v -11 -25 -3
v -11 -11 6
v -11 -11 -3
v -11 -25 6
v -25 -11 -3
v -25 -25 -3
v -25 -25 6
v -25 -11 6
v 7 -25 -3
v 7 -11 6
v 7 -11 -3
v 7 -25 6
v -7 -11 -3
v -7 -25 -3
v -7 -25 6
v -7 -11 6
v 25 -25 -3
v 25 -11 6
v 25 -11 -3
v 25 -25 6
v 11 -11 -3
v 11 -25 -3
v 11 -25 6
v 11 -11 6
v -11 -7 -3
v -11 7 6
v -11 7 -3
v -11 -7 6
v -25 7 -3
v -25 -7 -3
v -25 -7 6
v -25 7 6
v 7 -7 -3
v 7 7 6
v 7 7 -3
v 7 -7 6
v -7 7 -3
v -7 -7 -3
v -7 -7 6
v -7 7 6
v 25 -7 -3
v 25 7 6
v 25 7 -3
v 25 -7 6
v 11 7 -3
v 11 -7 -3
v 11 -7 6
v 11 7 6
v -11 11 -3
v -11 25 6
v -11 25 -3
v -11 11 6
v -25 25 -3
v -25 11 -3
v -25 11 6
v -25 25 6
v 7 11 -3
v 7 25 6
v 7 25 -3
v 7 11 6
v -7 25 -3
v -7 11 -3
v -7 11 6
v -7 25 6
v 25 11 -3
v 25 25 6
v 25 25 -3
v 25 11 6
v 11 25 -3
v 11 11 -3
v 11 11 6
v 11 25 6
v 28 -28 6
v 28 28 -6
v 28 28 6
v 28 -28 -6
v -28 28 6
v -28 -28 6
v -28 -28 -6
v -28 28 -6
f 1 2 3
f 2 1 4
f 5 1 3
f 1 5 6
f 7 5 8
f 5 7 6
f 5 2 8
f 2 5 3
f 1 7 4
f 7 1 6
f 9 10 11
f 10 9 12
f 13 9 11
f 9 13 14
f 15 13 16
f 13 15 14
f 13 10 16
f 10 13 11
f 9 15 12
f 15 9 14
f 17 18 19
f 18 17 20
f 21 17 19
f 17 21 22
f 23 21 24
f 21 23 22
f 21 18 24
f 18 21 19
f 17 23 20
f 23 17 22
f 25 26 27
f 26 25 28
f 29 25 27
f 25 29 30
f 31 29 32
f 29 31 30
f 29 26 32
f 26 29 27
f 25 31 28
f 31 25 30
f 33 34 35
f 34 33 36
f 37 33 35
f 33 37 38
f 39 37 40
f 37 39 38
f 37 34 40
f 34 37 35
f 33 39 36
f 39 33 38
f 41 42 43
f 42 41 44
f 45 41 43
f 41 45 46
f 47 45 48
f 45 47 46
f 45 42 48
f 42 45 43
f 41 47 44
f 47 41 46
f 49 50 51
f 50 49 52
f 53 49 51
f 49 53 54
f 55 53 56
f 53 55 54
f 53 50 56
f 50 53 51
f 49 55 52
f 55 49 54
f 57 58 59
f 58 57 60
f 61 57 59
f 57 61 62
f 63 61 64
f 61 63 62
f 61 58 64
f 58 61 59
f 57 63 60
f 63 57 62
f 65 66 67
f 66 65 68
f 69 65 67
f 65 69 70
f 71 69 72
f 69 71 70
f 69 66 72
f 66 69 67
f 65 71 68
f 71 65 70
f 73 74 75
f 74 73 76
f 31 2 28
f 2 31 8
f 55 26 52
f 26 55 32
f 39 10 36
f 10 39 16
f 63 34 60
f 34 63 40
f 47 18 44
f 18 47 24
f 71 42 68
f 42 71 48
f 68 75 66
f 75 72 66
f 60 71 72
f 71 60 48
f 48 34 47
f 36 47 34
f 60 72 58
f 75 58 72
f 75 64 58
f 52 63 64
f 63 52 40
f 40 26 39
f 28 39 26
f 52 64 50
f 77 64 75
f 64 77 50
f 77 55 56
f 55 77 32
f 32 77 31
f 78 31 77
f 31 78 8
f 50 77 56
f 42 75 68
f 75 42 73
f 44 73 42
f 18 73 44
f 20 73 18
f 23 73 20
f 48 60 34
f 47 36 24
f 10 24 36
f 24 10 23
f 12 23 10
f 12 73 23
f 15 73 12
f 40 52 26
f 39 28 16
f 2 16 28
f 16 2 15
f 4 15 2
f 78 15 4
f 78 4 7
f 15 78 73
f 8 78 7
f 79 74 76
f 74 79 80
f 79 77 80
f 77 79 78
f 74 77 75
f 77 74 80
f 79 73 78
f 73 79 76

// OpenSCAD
$fn = 32;

// ----------------------------------------------------------------------
// Pocket plate 56 x 56 x 12
// 3 x 3 pockets 14 mm square, 9 mm deep
// ----------------------------------------------------------------------

// --- parameters (mm) ---
thickness = 12;  // plate thickness
floor_t = 3;     // material left under each pocket
pocket = 14;     // pocket side length
pitch_x = 18;    // pocket pitch along X
pitch_y = 18;    // pocket pitch along Y
cols = 3;        // pockets per row
rows = 3;        // rows of pockets

// --- derived feature positions (mm) ---
depth = thickness - floor_t;        // = 9   pocket depth, down to the floor
span_x = (cols - 1) * pitch_x;      // = 36   distance between outer pockets
span_y = (rows - 1) * pitch_y;      // = 36   distance between outer pocket rows
origin_x = -span_x / 2;             // = -18   X of the first pocket
origin_y = -span_y / 2;             // = -18   Y of the first pocket
plate = [span_x + pocket + 6, span_y + pocket + 6, thickness];  // = [56, 56, 12]   overall size: pockets plus 3 mm of wall on each side
feature_centers = [
  [origin_x + 0 * pitch_x, origin_y + 0 * pitch_y],
  [origin_x + 1 * pitch_x, origin_y + 0 * pitch_y],
  [origin_x + 2 * pitch_x, origin_y + 0 * pitch_y],
  [origin_x + 0 * pitch_x, origin_y + 1 * pitch_y],
  [origin_x + 1 * pitch_x, origin_y + 1 * pitch_y],
  [origin_x + 2 * pitch_x, origin_y + 1 * pitch_y],
  [origin_x + 0 * pitch_x, origin_y + 2 * pitch_y],
  [origin_x + 1 * pitch_x, origin_y + 2 * pitch_y],
  [origin_x + 2 * pitch_x, origin_y + 2 * pitch_y]
];   // pocket centres, used verbatim by the cutter loop

// plate outline, then one pocket per centre in feature_centers
difference() {
  cube(plate, center = true);
  for (centre = feature_centers)
    translate([centre[0] - pocket / 2, centre[1] - pocket / 2, plate[2] / 2 - depth])
      cube([pocket, pocket, depth + 1]);  // centred on the declared pocket centre
}
